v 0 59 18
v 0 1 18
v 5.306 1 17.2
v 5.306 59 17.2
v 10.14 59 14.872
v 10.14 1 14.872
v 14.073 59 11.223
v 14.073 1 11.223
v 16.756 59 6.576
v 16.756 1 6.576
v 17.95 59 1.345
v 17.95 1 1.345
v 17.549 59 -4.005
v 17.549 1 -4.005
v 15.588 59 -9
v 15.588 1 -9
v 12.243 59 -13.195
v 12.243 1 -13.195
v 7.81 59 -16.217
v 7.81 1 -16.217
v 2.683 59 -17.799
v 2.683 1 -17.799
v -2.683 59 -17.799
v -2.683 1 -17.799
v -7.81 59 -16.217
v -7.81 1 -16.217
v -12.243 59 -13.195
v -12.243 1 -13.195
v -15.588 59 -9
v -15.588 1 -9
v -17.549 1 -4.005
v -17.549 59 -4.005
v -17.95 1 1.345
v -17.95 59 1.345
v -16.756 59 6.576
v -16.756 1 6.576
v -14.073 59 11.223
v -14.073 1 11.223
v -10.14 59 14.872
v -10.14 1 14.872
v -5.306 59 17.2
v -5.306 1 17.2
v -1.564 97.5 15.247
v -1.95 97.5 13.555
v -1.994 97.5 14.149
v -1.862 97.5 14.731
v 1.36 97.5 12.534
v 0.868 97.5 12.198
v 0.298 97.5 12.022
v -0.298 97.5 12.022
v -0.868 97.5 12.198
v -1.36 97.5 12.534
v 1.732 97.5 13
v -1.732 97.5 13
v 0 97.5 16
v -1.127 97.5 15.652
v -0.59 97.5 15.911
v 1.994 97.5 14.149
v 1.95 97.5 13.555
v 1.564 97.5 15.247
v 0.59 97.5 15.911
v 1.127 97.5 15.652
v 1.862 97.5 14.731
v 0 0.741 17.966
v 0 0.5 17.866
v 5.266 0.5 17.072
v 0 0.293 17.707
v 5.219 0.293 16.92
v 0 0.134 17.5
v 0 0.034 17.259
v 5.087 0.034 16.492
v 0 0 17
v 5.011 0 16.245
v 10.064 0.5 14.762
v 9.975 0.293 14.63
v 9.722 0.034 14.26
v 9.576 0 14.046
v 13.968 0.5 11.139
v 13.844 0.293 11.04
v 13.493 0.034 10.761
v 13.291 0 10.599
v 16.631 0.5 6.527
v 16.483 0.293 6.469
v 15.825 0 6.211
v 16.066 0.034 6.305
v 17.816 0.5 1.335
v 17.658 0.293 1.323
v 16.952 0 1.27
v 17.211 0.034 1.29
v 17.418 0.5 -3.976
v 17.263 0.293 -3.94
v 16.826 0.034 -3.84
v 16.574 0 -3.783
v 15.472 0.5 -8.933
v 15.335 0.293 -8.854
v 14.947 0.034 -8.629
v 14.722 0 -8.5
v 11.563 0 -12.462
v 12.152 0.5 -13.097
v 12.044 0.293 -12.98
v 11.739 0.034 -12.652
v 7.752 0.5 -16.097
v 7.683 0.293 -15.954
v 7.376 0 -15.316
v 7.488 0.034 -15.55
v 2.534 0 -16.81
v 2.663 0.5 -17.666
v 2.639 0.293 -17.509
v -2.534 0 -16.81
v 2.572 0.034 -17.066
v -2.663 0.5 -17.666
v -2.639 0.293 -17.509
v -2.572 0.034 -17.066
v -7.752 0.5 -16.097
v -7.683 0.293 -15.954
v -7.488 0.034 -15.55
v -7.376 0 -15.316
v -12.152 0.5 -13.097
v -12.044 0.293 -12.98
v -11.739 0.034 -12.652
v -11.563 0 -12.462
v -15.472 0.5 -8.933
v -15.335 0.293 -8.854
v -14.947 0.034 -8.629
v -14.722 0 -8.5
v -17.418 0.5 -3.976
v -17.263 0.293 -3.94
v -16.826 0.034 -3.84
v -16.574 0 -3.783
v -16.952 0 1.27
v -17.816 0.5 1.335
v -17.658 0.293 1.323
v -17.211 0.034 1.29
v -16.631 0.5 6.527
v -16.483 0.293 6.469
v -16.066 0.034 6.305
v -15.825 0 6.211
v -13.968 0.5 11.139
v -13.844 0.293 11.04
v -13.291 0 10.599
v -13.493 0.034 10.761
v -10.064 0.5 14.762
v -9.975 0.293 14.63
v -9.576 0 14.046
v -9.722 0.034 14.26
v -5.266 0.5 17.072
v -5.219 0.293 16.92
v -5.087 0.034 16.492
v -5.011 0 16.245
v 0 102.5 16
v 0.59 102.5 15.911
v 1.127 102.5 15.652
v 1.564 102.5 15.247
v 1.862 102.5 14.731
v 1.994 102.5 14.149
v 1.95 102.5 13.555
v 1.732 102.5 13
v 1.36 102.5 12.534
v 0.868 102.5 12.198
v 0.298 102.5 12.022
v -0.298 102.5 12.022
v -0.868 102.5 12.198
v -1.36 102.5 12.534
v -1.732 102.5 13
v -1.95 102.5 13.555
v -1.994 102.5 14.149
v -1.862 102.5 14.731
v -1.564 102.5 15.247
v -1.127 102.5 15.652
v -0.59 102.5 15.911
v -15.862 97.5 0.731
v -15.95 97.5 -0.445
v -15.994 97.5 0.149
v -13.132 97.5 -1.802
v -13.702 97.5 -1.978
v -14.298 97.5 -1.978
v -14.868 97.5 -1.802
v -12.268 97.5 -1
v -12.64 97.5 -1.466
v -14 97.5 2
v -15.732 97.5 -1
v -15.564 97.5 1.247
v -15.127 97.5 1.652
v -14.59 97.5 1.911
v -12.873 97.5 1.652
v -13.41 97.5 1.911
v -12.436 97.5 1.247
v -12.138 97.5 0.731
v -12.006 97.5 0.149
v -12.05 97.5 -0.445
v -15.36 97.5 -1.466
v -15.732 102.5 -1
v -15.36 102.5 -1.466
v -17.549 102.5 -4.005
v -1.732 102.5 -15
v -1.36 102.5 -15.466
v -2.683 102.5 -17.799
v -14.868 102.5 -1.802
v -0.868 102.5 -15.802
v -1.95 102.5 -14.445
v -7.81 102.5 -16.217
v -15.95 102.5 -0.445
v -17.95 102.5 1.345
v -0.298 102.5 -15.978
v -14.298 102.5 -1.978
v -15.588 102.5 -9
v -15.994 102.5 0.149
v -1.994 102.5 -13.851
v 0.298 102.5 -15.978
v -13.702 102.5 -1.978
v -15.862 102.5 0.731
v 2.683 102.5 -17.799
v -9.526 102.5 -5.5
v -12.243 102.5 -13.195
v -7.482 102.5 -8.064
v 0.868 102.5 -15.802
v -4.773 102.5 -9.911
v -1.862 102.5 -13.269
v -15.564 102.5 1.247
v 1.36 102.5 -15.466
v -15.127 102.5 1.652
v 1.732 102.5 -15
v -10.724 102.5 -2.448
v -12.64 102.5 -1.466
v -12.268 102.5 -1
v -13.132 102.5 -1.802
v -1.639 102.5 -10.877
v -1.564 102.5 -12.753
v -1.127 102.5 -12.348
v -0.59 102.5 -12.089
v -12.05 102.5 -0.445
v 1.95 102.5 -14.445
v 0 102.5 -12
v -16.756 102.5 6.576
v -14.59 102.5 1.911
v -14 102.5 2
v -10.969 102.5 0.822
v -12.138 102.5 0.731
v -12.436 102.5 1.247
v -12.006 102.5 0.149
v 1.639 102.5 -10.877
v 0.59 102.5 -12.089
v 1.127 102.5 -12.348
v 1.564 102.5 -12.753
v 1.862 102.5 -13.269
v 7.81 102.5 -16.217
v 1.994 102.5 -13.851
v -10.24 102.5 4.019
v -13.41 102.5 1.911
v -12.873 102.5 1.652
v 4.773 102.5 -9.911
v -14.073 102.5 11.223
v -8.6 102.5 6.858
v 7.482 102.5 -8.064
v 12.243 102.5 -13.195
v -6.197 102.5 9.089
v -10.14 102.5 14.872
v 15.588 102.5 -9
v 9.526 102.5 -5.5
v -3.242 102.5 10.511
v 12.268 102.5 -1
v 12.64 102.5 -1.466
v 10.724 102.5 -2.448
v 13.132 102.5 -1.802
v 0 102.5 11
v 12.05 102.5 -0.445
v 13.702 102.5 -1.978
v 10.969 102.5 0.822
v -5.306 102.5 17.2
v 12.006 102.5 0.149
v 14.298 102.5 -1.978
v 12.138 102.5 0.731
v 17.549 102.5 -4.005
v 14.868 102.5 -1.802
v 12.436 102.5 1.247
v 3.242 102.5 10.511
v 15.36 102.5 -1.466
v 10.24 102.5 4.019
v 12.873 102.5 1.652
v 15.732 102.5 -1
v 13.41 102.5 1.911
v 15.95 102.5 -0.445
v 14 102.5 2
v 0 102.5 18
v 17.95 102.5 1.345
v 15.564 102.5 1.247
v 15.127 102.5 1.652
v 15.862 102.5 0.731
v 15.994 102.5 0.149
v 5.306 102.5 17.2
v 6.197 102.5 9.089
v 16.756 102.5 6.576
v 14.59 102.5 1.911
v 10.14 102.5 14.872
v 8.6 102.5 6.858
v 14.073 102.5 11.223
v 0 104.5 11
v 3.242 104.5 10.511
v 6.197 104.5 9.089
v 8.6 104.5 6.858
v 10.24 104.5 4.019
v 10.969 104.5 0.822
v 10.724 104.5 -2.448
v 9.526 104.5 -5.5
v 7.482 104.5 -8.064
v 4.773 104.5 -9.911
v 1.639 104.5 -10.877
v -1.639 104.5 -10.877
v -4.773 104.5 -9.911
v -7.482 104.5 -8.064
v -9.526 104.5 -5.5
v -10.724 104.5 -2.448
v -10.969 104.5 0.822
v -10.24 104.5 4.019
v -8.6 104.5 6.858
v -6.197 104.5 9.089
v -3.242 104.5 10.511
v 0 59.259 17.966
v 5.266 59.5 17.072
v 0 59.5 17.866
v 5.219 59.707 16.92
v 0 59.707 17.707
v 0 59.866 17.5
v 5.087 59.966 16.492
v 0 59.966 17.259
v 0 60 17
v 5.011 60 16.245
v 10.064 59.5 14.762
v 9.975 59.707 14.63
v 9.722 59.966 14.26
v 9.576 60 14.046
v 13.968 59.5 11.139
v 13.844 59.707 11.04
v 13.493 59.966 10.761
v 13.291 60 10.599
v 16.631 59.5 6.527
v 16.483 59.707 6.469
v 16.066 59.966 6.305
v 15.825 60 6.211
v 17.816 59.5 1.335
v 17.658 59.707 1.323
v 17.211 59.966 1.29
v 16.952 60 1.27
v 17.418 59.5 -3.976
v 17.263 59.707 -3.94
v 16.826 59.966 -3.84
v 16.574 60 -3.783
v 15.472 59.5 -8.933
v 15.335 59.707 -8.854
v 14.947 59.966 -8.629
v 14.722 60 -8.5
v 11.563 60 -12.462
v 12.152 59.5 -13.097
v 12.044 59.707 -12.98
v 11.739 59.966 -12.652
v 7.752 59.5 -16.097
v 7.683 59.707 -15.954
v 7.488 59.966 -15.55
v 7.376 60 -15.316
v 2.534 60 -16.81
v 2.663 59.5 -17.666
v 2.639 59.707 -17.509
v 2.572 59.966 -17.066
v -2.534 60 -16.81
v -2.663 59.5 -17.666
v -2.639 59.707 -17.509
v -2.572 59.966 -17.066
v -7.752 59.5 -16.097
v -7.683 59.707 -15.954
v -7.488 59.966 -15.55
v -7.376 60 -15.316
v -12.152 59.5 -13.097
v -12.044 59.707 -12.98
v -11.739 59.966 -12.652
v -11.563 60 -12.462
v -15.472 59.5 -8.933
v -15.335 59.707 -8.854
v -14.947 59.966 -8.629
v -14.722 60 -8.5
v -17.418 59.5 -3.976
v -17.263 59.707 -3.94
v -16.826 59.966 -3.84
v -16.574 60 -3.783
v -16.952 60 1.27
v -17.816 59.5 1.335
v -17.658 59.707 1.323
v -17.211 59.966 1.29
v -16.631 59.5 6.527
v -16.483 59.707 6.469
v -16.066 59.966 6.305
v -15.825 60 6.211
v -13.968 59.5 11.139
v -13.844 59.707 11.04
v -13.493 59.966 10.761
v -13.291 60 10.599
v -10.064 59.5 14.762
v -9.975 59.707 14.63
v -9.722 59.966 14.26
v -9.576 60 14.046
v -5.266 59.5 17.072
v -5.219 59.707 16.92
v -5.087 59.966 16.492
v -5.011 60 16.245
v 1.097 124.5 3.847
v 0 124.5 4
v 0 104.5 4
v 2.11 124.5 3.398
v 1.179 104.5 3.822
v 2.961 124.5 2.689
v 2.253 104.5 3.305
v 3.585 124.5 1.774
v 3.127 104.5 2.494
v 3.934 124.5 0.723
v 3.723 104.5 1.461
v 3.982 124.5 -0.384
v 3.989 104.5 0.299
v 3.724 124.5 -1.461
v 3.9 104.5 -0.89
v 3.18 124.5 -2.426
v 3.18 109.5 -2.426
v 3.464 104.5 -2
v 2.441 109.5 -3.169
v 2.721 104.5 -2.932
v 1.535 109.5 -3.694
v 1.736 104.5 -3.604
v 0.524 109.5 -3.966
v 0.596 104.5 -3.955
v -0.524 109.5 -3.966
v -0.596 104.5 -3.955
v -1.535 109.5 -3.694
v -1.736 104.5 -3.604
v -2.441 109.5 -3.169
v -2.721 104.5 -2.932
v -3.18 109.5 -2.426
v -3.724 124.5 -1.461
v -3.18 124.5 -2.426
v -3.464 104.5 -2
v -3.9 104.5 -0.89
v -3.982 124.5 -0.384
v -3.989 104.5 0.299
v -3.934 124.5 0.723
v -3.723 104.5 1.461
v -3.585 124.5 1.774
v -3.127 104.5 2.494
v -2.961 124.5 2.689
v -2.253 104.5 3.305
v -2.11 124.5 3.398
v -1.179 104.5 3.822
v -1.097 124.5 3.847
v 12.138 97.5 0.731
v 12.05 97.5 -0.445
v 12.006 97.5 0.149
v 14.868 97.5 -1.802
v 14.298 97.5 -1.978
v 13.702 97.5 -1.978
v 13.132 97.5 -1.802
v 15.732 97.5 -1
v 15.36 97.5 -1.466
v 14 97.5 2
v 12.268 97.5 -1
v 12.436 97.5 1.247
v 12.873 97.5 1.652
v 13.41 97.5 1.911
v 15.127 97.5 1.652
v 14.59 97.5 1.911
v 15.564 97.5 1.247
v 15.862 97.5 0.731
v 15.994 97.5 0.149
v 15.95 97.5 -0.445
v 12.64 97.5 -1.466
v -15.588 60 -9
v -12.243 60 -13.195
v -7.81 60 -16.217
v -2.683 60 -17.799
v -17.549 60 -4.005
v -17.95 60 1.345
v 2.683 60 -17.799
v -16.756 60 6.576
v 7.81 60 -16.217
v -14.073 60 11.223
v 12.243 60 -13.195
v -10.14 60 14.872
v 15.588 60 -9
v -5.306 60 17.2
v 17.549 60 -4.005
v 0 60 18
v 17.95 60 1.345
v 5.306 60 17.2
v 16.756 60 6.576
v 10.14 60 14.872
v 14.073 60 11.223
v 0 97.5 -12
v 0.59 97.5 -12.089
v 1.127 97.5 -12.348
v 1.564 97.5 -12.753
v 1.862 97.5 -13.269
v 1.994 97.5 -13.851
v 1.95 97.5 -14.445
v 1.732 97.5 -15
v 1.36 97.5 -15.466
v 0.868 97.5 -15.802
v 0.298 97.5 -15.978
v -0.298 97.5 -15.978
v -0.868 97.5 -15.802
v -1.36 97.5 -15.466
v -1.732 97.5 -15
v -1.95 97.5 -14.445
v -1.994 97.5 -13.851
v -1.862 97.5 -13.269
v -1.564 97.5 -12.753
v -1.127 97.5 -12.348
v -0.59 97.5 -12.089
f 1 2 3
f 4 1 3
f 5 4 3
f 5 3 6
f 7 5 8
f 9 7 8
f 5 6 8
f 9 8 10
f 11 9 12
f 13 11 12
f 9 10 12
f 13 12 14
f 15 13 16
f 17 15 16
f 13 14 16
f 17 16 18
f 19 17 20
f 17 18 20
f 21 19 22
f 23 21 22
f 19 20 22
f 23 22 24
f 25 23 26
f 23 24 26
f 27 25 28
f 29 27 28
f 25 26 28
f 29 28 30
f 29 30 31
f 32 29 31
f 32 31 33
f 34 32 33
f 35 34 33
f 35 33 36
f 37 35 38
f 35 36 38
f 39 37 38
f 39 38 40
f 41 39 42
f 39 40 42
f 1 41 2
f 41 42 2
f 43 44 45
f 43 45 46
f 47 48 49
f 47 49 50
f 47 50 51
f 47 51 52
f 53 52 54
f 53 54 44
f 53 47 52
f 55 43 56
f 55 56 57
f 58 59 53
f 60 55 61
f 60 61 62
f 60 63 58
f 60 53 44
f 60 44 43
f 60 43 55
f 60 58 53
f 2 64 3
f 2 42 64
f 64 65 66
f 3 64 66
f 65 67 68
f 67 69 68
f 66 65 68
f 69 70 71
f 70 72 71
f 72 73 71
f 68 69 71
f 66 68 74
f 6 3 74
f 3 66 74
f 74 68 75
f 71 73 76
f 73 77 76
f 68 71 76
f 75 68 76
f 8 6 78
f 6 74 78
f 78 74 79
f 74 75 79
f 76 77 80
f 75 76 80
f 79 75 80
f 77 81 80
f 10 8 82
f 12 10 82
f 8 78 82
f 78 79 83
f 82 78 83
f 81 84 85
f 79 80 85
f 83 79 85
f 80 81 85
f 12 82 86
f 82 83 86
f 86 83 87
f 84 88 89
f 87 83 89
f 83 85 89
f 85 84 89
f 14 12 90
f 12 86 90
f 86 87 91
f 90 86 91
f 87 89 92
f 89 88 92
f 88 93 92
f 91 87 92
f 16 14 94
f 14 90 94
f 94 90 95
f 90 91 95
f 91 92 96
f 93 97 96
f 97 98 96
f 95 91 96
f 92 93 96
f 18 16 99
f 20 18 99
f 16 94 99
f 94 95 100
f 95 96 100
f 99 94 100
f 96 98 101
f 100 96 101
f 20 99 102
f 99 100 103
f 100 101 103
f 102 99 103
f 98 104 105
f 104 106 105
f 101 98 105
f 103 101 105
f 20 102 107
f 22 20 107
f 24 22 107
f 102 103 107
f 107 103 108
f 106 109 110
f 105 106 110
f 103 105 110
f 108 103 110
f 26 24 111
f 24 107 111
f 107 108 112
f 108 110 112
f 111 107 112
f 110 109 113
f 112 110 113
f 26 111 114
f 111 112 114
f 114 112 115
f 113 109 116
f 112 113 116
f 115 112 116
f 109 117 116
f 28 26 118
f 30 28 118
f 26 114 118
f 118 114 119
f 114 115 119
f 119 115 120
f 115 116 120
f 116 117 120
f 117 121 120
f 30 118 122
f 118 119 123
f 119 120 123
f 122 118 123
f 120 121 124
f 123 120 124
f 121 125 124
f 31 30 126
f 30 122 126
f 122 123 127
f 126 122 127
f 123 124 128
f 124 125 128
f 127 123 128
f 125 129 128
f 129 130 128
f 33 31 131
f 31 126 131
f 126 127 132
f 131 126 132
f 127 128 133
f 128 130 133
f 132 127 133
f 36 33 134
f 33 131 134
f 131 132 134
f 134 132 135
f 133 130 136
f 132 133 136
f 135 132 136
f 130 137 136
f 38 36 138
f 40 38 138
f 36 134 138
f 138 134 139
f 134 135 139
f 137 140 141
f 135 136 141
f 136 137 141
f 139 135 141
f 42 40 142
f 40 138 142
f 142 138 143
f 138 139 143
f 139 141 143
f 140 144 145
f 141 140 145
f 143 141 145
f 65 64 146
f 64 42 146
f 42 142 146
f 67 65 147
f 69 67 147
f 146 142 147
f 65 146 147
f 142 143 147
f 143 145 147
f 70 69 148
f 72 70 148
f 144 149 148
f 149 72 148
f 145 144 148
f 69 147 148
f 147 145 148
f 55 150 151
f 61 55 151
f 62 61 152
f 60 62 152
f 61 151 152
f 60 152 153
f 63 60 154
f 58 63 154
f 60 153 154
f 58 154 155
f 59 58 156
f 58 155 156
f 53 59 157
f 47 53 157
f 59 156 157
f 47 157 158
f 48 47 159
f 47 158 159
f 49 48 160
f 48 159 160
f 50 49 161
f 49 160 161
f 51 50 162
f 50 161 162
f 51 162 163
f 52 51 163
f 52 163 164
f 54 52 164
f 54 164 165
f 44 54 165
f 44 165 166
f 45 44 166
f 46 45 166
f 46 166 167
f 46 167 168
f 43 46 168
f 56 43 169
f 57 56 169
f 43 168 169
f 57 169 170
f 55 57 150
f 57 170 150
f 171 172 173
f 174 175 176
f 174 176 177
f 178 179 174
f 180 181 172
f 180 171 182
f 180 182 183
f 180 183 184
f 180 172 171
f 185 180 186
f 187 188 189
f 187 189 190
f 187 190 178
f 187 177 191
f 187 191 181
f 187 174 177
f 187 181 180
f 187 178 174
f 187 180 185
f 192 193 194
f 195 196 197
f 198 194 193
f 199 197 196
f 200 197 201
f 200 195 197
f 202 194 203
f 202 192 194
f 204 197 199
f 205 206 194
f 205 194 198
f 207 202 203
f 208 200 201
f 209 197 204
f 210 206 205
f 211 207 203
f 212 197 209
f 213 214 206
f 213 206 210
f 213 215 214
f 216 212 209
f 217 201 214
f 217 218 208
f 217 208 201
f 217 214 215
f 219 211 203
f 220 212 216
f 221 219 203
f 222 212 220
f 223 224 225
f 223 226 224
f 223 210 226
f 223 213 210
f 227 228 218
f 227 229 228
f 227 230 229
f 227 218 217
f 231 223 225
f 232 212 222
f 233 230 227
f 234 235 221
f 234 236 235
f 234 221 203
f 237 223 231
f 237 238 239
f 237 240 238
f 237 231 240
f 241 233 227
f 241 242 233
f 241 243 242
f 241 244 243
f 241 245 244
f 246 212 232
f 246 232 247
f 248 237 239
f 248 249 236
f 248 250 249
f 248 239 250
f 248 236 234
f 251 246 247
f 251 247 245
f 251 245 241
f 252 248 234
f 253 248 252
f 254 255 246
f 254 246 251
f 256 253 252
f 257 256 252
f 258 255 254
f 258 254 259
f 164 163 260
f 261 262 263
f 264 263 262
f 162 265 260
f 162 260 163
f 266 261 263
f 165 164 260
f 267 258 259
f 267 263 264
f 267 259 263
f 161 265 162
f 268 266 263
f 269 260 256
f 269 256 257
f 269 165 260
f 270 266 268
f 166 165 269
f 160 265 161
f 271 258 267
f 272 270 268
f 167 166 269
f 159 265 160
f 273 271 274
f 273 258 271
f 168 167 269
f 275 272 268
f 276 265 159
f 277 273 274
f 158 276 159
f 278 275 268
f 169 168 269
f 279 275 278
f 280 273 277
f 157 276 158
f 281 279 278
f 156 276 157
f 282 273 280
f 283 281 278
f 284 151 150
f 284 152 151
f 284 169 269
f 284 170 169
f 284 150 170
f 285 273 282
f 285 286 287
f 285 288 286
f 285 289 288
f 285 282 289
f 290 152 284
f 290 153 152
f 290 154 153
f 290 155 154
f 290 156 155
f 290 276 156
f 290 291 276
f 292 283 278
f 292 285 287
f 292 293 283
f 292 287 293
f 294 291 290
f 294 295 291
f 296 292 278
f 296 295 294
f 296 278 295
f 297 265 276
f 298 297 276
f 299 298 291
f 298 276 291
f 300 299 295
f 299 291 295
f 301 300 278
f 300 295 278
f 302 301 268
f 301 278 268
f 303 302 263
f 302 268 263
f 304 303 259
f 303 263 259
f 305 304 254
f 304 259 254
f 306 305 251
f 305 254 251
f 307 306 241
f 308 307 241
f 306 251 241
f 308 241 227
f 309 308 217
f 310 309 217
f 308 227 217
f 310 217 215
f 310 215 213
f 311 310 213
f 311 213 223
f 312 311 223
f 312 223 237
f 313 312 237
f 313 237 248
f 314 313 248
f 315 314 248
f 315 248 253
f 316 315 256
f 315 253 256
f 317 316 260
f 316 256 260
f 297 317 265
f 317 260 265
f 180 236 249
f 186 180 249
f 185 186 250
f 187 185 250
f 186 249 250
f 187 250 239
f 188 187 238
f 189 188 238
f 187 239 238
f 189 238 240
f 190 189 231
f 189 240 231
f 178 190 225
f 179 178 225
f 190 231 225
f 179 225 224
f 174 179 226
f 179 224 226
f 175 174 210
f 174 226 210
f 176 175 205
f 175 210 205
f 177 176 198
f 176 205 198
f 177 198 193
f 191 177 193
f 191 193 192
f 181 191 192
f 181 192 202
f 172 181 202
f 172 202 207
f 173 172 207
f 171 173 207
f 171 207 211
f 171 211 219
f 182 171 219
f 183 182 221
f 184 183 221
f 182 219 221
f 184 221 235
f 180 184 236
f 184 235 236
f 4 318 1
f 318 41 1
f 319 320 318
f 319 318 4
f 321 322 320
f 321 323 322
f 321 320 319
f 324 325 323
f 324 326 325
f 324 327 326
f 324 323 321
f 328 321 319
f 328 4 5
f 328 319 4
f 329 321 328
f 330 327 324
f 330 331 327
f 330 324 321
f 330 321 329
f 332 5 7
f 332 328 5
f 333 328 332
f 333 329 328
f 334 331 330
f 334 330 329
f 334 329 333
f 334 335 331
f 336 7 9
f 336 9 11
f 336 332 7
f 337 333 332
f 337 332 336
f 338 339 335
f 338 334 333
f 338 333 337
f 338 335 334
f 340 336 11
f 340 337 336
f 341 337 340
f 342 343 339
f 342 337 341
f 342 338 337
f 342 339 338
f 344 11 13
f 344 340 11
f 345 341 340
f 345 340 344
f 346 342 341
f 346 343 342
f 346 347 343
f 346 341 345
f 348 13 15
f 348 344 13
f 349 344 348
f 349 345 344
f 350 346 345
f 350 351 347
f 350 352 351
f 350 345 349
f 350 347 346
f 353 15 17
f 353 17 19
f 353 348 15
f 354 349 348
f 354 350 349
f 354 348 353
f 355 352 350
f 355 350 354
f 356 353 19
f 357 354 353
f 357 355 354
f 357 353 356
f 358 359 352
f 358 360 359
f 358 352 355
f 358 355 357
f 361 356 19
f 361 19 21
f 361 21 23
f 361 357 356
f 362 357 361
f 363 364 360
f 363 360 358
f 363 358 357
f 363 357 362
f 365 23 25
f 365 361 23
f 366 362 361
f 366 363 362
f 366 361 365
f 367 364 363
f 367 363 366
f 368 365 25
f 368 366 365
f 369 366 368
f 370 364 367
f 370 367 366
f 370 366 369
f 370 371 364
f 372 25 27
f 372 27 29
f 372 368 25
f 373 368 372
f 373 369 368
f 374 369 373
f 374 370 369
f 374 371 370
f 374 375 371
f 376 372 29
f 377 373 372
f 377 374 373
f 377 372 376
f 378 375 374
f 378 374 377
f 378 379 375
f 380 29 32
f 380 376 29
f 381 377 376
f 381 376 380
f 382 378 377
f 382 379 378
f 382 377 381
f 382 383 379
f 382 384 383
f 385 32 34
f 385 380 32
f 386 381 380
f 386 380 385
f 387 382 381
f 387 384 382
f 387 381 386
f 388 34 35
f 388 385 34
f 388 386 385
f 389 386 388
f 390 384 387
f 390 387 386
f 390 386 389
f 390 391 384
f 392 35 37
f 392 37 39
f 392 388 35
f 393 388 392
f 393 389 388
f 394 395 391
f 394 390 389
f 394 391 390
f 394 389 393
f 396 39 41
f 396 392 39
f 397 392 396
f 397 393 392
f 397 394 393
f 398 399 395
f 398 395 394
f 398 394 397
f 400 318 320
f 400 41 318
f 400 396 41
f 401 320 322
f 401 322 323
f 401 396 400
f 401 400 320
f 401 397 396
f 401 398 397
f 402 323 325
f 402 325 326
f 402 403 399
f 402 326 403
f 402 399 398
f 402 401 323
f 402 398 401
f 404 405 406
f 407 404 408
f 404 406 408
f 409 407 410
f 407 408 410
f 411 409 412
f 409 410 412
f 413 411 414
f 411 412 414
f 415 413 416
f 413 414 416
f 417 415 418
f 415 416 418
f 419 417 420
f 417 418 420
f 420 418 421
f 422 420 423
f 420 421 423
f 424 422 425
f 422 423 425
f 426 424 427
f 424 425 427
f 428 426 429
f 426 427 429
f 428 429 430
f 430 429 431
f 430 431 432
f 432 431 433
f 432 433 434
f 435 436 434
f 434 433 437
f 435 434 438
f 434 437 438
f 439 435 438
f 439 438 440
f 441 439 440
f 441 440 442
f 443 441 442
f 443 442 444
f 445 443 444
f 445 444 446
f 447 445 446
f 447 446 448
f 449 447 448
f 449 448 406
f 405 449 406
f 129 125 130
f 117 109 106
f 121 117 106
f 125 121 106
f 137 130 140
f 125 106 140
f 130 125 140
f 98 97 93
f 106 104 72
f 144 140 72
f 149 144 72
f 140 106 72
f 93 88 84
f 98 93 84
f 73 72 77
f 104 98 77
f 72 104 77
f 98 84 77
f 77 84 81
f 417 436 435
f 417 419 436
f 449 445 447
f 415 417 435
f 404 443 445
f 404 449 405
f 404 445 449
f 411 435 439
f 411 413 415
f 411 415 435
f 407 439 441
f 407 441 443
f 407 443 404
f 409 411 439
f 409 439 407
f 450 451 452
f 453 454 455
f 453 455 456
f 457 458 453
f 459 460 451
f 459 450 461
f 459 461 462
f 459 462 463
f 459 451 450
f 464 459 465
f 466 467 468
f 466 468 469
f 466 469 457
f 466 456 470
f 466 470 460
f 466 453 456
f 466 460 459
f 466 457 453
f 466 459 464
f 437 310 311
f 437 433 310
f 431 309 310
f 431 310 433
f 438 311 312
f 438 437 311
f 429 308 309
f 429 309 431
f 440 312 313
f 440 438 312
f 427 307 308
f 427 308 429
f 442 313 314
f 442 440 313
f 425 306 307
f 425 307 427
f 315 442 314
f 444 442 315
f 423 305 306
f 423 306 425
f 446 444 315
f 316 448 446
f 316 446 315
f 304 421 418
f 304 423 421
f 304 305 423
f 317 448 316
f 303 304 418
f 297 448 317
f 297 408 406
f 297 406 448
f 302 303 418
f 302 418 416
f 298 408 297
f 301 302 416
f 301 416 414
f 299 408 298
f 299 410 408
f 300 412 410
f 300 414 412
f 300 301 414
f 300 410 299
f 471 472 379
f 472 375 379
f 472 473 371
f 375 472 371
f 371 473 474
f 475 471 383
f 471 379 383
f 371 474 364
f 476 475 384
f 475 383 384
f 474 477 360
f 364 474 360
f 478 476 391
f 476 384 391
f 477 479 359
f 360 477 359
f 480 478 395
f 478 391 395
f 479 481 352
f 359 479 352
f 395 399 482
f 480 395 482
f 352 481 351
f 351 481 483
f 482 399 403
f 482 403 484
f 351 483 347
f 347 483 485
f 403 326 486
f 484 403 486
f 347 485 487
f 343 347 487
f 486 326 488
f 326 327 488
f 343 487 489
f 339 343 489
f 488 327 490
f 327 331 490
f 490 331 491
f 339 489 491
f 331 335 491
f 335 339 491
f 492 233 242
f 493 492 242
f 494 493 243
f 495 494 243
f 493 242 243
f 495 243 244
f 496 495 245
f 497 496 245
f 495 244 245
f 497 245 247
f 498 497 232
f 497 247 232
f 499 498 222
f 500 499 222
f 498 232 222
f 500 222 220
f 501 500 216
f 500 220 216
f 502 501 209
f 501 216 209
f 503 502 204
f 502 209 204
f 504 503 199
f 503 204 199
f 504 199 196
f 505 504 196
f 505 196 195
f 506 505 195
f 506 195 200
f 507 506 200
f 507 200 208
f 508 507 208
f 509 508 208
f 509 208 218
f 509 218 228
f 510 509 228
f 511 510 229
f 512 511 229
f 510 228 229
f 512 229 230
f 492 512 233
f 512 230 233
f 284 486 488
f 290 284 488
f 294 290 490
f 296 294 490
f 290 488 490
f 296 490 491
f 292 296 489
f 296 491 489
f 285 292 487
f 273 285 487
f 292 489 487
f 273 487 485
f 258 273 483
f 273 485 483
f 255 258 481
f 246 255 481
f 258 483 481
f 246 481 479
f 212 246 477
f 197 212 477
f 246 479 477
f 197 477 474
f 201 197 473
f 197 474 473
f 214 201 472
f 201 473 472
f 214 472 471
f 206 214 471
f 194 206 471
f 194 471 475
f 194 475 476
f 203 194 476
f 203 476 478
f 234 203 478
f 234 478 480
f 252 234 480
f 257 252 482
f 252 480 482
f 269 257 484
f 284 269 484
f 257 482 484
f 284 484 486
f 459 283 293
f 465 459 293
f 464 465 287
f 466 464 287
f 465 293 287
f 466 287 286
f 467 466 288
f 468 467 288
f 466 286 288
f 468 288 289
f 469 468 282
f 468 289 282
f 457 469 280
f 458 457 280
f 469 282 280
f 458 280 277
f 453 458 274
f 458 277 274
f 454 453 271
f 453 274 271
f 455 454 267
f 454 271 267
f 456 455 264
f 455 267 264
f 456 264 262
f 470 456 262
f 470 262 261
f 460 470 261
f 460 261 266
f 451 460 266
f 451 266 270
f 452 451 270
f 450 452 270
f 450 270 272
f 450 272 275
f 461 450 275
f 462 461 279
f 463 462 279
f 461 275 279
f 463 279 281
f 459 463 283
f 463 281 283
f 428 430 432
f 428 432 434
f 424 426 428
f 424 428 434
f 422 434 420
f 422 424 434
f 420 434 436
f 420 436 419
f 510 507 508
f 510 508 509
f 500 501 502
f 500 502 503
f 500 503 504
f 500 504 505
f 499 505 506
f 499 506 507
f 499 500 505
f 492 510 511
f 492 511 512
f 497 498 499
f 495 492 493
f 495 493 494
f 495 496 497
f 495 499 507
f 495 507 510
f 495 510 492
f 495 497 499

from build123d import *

# Parameters (mm, degrees)
SKETCH_1_R          = 18
EXTRUDE_1_DEPTH     = 60
FILLET_1_R          = 1
SKETCH_3_R          = 18
EXTRUDE_2_DEPTH     = 42.5
SKETCH_4_R          = 11
EXTRUDE_3_DEPTH     = 2
SKETCH_5_R          = 4
EXTRUDE_4_DEPTH     = 20
CUT_EXTRUDE_START   = -15
CUT_EXTRUDE_1_DEPTH = 15
SKETCH_7_R          = 2
CUT_EXTRUDE_2_DEPTH = 5


with BuildPart() as part:
    # 草图1 → 凸台-拉伸1 (new body)
    with BuildSketch(Plane(origin=(0, 0, 0), x_dir=(1, 0, 0), z_dir=(0, 1, 0))):
        with Locations(Location((0, 0, 0), (0, 0, 270))):
            Circle(SKETCH_1_R)
    extrude(amount=EXTRUDE_1_DEPTH)

    # 圆角1
    fillet_1_edges = [part.edges().sort_by_distance(p)[0] for p in [
        (0, 0, -18),
        (0, 60, -18),
    ]]
    fillet(fillet_1_edges, radius=FILLET_1_R)

    # 草图3 → 凸台-拉伸2 (add)
    with BuildSketch(Plane(origin=(0, 60, 0), x_dir=(1, 0, 0), z_dir=(0, 1, 0))):
        with Locations(Location((0, 0, 0), (0, 0, 270))):
            Circle(SKETCH_3_R)
    extrude(amount=EXTRUDE_2_DEPTH)

    # 草图4 → 凸台-拉伸3 (add)
    with BuildSketch(Plane(origin=(0, 102.5, 0), x_dir=(1, 0, 0), z_dir=(0, 1, 0))):
        with Locations(Location((0, 0, 0), (0, 0, 270))):
            Circle(SKETCH_4_R)
    extrude(amount=EXTRUDE_3_DEPTH)

    # 草图5 → 凸台-拉伸4 (add)
    with BuildSketch(Plane(origin=(0, 104.5, 0), x_dir=(1, 0, 0), z_dir=(0, 1, 0))):
        with Locations(Location((0, 0, 0), (0, 0, 270))):
            Circle(SKETCH_5_R)
    extrude(amount=EXTRUDE_4_DEPTH)

    # 草图6 → 切除-拉伸1 (cut)
    with BuildSketch(Plane(origin=(0, 124.5, 0), x_dir=(1, 0, 0), z_dir=(0, 1, 0)).offset(CUT_EXTRUDE_START)):
        with BuildLine():
            Line((-3.180068641, 2.426347758), (3.180068641, 2.426347758))
            ThreePointArc((3.180068641, 2.426347758), (0, 4), (-3.180068641, 2.426347758))
        make_face()
    extrude(amount=CUT_EXTRUDE_1_DEPTH, mode=Mode.SUBTRACT)

    # 草图7 → 切除-拉伸2 (cut)
    with BuildSketch(Plane(origin=(0, 102.5, 0), x_dir=(1, 0, 0), z_dir=(0, 1, 0))):
        with Locations(Location((0, 14, 0), (0, 0, 270))):
            Circle(SKETCH_7_R)
        with Locations(Location((14, 0, 0), (0, 0, 270))):
            Circle(SKETCH_7_R)
        with Locations(Location((0, -14, 0), (0, 0, 270))):
            Circle(SKETCH_7_R)
        with Locations(Location((-14, 0, 0), (0, 0, 270))):
            Circle(SKETCH_7_R)
    extrude(amount=-CUT_EXTRUDE_2_DEPTH, mode=Mode.SUBTRACT)


solid = part.part
